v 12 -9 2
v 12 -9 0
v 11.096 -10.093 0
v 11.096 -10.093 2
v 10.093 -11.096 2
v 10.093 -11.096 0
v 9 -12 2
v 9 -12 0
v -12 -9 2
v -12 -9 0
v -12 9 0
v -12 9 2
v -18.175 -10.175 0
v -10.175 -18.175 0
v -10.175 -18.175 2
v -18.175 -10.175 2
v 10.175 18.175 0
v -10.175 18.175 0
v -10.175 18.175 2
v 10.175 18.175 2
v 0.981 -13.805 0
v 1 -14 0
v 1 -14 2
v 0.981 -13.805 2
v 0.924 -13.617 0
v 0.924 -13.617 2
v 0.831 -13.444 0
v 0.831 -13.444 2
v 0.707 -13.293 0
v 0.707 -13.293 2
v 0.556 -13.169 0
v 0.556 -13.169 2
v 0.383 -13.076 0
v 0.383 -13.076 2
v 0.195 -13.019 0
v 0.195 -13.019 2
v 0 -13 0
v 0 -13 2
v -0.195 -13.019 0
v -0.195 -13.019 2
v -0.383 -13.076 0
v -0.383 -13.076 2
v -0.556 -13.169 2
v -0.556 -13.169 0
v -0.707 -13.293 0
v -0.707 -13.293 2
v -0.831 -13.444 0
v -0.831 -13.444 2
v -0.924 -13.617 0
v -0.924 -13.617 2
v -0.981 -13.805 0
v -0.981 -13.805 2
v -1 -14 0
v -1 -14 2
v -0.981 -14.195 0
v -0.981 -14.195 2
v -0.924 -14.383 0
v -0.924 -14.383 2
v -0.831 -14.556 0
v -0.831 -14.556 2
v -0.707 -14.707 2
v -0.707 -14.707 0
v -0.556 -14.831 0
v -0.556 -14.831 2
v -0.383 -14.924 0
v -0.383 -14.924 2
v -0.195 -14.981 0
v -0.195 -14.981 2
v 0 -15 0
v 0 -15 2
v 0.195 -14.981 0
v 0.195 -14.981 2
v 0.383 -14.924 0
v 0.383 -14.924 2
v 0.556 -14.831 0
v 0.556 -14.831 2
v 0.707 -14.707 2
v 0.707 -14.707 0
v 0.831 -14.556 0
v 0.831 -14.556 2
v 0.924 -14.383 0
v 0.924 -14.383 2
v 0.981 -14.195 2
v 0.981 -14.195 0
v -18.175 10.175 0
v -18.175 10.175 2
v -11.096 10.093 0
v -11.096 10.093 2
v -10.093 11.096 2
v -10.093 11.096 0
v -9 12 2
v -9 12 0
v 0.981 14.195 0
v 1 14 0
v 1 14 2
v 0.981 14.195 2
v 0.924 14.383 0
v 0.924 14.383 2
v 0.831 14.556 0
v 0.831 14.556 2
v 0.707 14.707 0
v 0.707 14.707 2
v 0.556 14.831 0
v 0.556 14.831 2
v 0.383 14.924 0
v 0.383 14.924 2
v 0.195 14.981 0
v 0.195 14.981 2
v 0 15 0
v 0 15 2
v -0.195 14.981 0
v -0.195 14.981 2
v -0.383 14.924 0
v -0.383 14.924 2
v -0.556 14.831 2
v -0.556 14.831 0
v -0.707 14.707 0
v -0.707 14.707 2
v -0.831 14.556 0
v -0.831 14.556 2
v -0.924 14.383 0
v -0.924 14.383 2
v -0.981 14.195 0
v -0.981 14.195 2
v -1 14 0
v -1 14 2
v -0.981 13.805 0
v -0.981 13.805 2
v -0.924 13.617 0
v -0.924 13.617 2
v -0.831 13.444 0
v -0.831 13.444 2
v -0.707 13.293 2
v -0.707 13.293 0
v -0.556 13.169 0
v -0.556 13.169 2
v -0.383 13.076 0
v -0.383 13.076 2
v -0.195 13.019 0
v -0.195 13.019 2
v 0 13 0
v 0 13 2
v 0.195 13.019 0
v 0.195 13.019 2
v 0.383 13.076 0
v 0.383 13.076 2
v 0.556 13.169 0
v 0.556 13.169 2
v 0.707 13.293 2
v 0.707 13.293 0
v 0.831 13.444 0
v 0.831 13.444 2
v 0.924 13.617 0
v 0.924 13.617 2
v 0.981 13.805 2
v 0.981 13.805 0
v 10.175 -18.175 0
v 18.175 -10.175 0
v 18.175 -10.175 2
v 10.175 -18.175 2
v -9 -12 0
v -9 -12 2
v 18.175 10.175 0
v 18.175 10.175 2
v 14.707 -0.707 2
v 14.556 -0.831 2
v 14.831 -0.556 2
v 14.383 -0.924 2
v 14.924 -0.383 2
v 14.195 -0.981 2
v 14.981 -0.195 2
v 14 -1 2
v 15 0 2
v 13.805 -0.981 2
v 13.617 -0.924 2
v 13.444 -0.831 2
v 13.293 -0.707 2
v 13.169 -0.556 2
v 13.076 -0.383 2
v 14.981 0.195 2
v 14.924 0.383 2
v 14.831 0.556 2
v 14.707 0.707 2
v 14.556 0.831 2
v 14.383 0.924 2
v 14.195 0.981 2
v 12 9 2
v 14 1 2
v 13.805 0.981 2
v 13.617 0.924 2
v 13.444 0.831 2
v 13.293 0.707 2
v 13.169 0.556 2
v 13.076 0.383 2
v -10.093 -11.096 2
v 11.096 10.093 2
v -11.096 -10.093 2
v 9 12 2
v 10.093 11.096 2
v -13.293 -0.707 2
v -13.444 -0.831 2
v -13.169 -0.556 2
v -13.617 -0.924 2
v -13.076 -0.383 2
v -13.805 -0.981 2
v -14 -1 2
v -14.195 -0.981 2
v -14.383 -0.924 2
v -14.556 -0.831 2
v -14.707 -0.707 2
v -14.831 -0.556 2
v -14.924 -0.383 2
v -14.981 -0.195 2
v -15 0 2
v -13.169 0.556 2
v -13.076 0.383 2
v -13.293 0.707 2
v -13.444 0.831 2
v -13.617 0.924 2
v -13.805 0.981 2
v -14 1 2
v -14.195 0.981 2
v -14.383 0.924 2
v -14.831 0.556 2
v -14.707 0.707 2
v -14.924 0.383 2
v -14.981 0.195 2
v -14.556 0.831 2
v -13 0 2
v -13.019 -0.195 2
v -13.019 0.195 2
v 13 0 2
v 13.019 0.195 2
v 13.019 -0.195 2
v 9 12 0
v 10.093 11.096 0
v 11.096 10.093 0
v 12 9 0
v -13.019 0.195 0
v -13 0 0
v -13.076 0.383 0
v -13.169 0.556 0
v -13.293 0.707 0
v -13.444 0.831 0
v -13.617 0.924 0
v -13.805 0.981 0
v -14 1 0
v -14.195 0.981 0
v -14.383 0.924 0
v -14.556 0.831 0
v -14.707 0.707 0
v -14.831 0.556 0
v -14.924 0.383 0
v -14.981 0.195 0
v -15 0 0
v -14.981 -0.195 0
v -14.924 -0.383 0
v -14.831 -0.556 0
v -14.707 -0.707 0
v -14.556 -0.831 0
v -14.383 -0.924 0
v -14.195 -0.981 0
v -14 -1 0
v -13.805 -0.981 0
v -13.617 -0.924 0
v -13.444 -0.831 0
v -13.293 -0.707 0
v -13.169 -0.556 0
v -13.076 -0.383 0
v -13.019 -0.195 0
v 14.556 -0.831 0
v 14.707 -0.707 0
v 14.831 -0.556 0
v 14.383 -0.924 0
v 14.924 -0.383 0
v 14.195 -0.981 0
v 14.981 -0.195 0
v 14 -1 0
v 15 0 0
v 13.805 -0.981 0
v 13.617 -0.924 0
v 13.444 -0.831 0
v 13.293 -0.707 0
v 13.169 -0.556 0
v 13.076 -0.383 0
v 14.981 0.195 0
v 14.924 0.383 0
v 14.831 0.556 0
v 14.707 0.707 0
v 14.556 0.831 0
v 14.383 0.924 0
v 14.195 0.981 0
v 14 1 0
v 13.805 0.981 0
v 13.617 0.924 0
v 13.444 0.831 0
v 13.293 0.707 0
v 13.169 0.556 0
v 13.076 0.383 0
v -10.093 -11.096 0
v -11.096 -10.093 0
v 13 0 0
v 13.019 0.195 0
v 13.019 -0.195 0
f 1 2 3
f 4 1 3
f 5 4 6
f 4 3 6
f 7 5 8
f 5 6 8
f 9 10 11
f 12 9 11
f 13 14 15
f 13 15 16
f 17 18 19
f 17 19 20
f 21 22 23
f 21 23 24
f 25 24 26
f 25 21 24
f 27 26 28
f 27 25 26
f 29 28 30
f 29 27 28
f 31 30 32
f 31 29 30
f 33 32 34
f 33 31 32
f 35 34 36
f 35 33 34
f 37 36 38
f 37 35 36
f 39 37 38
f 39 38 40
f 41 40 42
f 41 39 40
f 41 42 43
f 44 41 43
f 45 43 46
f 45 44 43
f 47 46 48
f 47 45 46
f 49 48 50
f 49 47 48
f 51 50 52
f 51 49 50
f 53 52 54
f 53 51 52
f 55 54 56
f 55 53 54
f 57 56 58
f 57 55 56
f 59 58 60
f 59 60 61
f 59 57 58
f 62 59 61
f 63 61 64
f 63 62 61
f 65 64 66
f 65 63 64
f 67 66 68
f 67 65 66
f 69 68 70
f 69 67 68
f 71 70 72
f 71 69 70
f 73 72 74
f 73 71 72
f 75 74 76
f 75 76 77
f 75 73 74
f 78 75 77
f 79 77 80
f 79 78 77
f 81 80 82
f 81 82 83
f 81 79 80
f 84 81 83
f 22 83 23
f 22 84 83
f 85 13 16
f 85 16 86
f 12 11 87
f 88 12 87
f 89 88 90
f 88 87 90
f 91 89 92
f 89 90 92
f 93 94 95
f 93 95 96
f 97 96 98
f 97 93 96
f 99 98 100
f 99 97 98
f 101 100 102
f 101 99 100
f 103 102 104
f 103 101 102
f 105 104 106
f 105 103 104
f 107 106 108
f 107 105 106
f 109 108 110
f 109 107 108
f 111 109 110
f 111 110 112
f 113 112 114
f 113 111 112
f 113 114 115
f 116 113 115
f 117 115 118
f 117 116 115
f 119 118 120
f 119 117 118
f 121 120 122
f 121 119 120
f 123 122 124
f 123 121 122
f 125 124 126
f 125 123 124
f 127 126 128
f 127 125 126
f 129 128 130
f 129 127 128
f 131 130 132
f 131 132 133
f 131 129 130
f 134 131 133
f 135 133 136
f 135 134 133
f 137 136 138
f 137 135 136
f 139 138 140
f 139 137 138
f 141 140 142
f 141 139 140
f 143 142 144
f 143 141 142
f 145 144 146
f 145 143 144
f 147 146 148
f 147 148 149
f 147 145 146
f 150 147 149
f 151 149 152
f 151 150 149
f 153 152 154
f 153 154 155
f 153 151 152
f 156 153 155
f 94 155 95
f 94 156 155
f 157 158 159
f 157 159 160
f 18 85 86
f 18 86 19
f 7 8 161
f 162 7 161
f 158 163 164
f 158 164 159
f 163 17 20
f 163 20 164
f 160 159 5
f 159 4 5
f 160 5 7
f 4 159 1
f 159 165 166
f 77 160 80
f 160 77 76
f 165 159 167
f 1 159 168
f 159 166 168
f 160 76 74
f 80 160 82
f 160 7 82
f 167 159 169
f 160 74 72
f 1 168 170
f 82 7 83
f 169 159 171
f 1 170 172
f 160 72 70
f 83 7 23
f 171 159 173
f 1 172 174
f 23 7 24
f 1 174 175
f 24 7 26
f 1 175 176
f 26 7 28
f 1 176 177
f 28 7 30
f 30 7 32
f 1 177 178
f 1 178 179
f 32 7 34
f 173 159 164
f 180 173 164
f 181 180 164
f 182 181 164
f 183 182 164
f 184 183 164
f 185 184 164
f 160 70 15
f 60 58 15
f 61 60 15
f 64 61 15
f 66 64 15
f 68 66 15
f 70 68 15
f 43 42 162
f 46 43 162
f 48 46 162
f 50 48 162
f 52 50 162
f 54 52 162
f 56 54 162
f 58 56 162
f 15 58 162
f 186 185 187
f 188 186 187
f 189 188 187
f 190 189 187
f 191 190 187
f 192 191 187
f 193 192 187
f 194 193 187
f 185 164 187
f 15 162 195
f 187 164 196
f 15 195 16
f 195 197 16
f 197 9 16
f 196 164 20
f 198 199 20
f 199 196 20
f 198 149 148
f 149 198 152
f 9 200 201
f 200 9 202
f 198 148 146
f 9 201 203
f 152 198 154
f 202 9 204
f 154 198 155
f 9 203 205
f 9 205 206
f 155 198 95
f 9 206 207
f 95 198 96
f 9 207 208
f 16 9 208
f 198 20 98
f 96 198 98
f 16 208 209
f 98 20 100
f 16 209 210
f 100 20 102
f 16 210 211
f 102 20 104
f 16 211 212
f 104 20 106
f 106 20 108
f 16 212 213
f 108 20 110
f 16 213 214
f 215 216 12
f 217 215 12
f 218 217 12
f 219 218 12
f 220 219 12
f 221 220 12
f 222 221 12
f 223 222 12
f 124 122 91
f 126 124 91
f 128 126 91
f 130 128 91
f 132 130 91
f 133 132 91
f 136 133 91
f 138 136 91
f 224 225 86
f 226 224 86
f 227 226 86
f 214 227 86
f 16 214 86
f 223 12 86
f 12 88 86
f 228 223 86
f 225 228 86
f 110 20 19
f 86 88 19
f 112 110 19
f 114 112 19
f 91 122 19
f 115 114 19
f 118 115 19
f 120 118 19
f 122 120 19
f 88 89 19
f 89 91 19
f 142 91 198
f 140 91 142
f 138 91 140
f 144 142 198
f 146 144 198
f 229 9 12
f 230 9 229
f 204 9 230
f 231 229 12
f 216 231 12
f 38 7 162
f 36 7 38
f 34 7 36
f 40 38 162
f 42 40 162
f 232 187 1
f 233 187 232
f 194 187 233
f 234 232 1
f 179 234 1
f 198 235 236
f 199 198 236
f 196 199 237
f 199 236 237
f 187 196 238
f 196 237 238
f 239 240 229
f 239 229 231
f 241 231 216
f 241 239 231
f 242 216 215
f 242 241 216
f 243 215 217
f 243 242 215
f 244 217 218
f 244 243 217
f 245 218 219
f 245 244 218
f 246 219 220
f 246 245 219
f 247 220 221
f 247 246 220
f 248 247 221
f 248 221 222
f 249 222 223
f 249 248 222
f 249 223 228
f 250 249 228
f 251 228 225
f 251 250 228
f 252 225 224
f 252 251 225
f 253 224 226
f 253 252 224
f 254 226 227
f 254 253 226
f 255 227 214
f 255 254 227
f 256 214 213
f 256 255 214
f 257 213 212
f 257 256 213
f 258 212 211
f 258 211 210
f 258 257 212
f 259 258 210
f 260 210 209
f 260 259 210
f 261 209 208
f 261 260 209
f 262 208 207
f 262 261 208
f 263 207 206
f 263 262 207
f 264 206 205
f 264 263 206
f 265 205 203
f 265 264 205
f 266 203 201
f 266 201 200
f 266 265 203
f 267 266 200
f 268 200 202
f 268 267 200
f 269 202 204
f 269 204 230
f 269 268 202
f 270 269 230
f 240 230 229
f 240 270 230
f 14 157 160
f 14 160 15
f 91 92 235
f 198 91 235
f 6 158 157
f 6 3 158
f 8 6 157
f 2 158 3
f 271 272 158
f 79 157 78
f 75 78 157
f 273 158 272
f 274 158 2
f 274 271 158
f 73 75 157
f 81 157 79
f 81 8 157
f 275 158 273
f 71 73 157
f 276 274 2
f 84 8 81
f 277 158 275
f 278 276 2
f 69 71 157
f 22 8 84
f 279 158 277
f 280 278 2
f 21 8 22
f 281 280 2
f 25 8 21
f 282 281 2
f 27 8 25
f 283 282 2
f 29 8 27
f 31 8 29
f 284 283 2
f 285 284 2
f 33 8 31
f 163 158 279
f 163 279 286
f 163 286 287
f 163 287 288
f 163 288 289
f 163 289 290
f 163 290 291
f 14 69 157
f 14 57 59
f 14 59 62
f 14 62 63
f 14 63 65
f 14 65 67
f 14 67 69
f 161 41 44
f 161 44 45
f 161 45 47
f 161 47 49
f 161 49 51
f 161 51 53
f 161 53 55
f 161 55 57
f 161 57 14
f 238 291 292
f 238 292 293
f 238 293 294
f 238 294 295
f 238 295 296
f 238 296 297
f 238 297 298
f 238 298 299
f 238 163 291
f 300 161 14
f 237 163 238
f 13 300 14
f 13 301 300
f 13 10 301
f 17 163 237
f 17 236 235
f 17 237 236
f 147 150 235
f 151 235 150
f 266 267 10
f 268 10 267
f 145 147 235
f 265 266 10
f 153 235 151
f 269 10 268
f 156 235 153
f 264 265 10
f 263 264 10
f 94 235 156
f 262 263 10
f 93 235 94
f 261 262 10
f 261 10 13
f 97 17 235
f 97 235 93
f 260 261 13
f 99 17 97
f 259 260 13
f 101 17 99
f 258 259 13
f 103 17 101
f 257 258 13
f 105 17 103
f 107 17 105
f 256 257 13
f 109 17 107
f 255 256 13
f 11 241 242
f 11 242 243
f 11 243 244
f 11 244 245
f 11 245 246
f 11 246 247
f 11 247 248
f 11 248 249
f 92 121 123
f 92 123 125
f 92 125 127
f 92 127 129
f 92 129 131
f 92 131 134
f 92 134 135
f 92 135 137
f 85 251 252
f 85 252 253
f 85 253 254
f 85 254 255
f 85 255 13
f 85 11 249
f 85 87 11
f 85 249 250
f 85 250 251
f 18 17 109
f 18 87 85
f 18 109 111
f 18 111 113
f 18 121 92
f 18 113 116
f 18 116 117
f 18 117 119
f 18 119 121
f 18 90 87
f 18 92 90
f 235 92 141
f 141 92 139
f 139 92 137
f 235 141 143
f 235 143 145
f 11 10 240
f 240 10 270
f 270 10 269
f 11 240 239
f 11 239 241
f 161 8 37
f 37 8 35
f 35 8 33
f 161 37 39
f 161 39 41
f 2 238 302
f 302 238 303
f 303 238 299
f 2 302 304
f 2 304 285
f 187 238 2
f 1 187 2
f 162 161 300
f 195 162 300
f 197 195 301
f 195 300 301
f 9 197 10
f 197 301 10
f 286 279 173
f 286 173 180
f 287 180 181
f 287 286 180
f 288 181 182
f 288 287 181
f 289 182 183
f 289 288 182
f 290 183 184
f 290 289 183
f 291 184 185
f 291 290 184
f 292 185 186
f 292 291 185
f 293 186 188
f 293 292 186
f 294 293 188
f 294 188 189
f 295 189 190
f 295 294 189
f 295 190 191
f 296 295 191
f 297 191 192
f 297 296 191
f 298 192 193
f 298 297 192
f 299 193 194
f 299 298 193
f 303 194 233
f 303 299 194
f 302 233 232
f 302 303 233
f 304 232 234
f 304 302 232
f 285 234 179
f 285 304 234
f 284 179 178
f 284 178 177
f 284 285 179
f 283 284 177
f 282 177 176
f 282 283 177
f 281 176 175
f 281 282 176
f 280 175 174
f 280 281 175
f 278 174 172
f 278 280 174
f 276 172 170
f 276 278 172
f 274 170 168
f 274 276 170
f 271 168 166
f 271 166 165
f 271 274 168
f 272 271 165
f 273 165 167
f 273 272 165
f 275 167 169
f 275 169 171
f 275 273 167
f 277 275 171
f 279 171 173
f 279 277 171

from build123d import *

# Parameters (mm, degrees)
SKETCH_1_R      = 1
EXTRUDE_1_DEPTH = 2


with BuildPart() as part:
    # 草图1 → 凸台-拉伸1 (new body)
    with BuildSketch(Plane.XY):
        Polygon((-18.175, 10.175), (-10.175, 18.175), (10.175, 18.175), (18.175, 10.175), (18.175, -10.175), (10.175, -18.175), (-10.175, -18.175), (-18.175, -10.175), align=None)
        with Locations((0, 14)):
            Circle(SKETCH_1_R, mode=Mode.SUBTRACT)
        with Locations((14, 0)):
            Circle(SKETCH_1_R, mode=Mode.SUBTRACT)
        with Locations((-14, 0)):
            Circle(SKETCH_1_R, mode=Mode.SUBTRACT)
        with Locations((0, -14)):
            Circle(SKETCH_1_R, mode=Mode.SUBTRACT)
        with BuildLine():
            Line((-9, 12), (9, 12))
            ThreePointArc((9, 12), (10.606601718, 10.606601718), (12, 9))
            Line((12, 9), (12, -9))
            ThreePointArc((12, -9), (10.606601718, -10.606601718), (9, -12))
            Line((9, -12), (-9, -12))
            ThreePointArc((-9, -12), (-10.606601718, -10.606601718), (-12, -9))
            Line((-12, -9), (-12, 9))
            ThreePointArc((-12, 9), (-10.606601718, 10.606601718), (-9, 12))
        make_face(mode=Mode.SUBTRACT)
    extrude(amount=EXTRUDE_1_DEPTH)


solid = part.part
